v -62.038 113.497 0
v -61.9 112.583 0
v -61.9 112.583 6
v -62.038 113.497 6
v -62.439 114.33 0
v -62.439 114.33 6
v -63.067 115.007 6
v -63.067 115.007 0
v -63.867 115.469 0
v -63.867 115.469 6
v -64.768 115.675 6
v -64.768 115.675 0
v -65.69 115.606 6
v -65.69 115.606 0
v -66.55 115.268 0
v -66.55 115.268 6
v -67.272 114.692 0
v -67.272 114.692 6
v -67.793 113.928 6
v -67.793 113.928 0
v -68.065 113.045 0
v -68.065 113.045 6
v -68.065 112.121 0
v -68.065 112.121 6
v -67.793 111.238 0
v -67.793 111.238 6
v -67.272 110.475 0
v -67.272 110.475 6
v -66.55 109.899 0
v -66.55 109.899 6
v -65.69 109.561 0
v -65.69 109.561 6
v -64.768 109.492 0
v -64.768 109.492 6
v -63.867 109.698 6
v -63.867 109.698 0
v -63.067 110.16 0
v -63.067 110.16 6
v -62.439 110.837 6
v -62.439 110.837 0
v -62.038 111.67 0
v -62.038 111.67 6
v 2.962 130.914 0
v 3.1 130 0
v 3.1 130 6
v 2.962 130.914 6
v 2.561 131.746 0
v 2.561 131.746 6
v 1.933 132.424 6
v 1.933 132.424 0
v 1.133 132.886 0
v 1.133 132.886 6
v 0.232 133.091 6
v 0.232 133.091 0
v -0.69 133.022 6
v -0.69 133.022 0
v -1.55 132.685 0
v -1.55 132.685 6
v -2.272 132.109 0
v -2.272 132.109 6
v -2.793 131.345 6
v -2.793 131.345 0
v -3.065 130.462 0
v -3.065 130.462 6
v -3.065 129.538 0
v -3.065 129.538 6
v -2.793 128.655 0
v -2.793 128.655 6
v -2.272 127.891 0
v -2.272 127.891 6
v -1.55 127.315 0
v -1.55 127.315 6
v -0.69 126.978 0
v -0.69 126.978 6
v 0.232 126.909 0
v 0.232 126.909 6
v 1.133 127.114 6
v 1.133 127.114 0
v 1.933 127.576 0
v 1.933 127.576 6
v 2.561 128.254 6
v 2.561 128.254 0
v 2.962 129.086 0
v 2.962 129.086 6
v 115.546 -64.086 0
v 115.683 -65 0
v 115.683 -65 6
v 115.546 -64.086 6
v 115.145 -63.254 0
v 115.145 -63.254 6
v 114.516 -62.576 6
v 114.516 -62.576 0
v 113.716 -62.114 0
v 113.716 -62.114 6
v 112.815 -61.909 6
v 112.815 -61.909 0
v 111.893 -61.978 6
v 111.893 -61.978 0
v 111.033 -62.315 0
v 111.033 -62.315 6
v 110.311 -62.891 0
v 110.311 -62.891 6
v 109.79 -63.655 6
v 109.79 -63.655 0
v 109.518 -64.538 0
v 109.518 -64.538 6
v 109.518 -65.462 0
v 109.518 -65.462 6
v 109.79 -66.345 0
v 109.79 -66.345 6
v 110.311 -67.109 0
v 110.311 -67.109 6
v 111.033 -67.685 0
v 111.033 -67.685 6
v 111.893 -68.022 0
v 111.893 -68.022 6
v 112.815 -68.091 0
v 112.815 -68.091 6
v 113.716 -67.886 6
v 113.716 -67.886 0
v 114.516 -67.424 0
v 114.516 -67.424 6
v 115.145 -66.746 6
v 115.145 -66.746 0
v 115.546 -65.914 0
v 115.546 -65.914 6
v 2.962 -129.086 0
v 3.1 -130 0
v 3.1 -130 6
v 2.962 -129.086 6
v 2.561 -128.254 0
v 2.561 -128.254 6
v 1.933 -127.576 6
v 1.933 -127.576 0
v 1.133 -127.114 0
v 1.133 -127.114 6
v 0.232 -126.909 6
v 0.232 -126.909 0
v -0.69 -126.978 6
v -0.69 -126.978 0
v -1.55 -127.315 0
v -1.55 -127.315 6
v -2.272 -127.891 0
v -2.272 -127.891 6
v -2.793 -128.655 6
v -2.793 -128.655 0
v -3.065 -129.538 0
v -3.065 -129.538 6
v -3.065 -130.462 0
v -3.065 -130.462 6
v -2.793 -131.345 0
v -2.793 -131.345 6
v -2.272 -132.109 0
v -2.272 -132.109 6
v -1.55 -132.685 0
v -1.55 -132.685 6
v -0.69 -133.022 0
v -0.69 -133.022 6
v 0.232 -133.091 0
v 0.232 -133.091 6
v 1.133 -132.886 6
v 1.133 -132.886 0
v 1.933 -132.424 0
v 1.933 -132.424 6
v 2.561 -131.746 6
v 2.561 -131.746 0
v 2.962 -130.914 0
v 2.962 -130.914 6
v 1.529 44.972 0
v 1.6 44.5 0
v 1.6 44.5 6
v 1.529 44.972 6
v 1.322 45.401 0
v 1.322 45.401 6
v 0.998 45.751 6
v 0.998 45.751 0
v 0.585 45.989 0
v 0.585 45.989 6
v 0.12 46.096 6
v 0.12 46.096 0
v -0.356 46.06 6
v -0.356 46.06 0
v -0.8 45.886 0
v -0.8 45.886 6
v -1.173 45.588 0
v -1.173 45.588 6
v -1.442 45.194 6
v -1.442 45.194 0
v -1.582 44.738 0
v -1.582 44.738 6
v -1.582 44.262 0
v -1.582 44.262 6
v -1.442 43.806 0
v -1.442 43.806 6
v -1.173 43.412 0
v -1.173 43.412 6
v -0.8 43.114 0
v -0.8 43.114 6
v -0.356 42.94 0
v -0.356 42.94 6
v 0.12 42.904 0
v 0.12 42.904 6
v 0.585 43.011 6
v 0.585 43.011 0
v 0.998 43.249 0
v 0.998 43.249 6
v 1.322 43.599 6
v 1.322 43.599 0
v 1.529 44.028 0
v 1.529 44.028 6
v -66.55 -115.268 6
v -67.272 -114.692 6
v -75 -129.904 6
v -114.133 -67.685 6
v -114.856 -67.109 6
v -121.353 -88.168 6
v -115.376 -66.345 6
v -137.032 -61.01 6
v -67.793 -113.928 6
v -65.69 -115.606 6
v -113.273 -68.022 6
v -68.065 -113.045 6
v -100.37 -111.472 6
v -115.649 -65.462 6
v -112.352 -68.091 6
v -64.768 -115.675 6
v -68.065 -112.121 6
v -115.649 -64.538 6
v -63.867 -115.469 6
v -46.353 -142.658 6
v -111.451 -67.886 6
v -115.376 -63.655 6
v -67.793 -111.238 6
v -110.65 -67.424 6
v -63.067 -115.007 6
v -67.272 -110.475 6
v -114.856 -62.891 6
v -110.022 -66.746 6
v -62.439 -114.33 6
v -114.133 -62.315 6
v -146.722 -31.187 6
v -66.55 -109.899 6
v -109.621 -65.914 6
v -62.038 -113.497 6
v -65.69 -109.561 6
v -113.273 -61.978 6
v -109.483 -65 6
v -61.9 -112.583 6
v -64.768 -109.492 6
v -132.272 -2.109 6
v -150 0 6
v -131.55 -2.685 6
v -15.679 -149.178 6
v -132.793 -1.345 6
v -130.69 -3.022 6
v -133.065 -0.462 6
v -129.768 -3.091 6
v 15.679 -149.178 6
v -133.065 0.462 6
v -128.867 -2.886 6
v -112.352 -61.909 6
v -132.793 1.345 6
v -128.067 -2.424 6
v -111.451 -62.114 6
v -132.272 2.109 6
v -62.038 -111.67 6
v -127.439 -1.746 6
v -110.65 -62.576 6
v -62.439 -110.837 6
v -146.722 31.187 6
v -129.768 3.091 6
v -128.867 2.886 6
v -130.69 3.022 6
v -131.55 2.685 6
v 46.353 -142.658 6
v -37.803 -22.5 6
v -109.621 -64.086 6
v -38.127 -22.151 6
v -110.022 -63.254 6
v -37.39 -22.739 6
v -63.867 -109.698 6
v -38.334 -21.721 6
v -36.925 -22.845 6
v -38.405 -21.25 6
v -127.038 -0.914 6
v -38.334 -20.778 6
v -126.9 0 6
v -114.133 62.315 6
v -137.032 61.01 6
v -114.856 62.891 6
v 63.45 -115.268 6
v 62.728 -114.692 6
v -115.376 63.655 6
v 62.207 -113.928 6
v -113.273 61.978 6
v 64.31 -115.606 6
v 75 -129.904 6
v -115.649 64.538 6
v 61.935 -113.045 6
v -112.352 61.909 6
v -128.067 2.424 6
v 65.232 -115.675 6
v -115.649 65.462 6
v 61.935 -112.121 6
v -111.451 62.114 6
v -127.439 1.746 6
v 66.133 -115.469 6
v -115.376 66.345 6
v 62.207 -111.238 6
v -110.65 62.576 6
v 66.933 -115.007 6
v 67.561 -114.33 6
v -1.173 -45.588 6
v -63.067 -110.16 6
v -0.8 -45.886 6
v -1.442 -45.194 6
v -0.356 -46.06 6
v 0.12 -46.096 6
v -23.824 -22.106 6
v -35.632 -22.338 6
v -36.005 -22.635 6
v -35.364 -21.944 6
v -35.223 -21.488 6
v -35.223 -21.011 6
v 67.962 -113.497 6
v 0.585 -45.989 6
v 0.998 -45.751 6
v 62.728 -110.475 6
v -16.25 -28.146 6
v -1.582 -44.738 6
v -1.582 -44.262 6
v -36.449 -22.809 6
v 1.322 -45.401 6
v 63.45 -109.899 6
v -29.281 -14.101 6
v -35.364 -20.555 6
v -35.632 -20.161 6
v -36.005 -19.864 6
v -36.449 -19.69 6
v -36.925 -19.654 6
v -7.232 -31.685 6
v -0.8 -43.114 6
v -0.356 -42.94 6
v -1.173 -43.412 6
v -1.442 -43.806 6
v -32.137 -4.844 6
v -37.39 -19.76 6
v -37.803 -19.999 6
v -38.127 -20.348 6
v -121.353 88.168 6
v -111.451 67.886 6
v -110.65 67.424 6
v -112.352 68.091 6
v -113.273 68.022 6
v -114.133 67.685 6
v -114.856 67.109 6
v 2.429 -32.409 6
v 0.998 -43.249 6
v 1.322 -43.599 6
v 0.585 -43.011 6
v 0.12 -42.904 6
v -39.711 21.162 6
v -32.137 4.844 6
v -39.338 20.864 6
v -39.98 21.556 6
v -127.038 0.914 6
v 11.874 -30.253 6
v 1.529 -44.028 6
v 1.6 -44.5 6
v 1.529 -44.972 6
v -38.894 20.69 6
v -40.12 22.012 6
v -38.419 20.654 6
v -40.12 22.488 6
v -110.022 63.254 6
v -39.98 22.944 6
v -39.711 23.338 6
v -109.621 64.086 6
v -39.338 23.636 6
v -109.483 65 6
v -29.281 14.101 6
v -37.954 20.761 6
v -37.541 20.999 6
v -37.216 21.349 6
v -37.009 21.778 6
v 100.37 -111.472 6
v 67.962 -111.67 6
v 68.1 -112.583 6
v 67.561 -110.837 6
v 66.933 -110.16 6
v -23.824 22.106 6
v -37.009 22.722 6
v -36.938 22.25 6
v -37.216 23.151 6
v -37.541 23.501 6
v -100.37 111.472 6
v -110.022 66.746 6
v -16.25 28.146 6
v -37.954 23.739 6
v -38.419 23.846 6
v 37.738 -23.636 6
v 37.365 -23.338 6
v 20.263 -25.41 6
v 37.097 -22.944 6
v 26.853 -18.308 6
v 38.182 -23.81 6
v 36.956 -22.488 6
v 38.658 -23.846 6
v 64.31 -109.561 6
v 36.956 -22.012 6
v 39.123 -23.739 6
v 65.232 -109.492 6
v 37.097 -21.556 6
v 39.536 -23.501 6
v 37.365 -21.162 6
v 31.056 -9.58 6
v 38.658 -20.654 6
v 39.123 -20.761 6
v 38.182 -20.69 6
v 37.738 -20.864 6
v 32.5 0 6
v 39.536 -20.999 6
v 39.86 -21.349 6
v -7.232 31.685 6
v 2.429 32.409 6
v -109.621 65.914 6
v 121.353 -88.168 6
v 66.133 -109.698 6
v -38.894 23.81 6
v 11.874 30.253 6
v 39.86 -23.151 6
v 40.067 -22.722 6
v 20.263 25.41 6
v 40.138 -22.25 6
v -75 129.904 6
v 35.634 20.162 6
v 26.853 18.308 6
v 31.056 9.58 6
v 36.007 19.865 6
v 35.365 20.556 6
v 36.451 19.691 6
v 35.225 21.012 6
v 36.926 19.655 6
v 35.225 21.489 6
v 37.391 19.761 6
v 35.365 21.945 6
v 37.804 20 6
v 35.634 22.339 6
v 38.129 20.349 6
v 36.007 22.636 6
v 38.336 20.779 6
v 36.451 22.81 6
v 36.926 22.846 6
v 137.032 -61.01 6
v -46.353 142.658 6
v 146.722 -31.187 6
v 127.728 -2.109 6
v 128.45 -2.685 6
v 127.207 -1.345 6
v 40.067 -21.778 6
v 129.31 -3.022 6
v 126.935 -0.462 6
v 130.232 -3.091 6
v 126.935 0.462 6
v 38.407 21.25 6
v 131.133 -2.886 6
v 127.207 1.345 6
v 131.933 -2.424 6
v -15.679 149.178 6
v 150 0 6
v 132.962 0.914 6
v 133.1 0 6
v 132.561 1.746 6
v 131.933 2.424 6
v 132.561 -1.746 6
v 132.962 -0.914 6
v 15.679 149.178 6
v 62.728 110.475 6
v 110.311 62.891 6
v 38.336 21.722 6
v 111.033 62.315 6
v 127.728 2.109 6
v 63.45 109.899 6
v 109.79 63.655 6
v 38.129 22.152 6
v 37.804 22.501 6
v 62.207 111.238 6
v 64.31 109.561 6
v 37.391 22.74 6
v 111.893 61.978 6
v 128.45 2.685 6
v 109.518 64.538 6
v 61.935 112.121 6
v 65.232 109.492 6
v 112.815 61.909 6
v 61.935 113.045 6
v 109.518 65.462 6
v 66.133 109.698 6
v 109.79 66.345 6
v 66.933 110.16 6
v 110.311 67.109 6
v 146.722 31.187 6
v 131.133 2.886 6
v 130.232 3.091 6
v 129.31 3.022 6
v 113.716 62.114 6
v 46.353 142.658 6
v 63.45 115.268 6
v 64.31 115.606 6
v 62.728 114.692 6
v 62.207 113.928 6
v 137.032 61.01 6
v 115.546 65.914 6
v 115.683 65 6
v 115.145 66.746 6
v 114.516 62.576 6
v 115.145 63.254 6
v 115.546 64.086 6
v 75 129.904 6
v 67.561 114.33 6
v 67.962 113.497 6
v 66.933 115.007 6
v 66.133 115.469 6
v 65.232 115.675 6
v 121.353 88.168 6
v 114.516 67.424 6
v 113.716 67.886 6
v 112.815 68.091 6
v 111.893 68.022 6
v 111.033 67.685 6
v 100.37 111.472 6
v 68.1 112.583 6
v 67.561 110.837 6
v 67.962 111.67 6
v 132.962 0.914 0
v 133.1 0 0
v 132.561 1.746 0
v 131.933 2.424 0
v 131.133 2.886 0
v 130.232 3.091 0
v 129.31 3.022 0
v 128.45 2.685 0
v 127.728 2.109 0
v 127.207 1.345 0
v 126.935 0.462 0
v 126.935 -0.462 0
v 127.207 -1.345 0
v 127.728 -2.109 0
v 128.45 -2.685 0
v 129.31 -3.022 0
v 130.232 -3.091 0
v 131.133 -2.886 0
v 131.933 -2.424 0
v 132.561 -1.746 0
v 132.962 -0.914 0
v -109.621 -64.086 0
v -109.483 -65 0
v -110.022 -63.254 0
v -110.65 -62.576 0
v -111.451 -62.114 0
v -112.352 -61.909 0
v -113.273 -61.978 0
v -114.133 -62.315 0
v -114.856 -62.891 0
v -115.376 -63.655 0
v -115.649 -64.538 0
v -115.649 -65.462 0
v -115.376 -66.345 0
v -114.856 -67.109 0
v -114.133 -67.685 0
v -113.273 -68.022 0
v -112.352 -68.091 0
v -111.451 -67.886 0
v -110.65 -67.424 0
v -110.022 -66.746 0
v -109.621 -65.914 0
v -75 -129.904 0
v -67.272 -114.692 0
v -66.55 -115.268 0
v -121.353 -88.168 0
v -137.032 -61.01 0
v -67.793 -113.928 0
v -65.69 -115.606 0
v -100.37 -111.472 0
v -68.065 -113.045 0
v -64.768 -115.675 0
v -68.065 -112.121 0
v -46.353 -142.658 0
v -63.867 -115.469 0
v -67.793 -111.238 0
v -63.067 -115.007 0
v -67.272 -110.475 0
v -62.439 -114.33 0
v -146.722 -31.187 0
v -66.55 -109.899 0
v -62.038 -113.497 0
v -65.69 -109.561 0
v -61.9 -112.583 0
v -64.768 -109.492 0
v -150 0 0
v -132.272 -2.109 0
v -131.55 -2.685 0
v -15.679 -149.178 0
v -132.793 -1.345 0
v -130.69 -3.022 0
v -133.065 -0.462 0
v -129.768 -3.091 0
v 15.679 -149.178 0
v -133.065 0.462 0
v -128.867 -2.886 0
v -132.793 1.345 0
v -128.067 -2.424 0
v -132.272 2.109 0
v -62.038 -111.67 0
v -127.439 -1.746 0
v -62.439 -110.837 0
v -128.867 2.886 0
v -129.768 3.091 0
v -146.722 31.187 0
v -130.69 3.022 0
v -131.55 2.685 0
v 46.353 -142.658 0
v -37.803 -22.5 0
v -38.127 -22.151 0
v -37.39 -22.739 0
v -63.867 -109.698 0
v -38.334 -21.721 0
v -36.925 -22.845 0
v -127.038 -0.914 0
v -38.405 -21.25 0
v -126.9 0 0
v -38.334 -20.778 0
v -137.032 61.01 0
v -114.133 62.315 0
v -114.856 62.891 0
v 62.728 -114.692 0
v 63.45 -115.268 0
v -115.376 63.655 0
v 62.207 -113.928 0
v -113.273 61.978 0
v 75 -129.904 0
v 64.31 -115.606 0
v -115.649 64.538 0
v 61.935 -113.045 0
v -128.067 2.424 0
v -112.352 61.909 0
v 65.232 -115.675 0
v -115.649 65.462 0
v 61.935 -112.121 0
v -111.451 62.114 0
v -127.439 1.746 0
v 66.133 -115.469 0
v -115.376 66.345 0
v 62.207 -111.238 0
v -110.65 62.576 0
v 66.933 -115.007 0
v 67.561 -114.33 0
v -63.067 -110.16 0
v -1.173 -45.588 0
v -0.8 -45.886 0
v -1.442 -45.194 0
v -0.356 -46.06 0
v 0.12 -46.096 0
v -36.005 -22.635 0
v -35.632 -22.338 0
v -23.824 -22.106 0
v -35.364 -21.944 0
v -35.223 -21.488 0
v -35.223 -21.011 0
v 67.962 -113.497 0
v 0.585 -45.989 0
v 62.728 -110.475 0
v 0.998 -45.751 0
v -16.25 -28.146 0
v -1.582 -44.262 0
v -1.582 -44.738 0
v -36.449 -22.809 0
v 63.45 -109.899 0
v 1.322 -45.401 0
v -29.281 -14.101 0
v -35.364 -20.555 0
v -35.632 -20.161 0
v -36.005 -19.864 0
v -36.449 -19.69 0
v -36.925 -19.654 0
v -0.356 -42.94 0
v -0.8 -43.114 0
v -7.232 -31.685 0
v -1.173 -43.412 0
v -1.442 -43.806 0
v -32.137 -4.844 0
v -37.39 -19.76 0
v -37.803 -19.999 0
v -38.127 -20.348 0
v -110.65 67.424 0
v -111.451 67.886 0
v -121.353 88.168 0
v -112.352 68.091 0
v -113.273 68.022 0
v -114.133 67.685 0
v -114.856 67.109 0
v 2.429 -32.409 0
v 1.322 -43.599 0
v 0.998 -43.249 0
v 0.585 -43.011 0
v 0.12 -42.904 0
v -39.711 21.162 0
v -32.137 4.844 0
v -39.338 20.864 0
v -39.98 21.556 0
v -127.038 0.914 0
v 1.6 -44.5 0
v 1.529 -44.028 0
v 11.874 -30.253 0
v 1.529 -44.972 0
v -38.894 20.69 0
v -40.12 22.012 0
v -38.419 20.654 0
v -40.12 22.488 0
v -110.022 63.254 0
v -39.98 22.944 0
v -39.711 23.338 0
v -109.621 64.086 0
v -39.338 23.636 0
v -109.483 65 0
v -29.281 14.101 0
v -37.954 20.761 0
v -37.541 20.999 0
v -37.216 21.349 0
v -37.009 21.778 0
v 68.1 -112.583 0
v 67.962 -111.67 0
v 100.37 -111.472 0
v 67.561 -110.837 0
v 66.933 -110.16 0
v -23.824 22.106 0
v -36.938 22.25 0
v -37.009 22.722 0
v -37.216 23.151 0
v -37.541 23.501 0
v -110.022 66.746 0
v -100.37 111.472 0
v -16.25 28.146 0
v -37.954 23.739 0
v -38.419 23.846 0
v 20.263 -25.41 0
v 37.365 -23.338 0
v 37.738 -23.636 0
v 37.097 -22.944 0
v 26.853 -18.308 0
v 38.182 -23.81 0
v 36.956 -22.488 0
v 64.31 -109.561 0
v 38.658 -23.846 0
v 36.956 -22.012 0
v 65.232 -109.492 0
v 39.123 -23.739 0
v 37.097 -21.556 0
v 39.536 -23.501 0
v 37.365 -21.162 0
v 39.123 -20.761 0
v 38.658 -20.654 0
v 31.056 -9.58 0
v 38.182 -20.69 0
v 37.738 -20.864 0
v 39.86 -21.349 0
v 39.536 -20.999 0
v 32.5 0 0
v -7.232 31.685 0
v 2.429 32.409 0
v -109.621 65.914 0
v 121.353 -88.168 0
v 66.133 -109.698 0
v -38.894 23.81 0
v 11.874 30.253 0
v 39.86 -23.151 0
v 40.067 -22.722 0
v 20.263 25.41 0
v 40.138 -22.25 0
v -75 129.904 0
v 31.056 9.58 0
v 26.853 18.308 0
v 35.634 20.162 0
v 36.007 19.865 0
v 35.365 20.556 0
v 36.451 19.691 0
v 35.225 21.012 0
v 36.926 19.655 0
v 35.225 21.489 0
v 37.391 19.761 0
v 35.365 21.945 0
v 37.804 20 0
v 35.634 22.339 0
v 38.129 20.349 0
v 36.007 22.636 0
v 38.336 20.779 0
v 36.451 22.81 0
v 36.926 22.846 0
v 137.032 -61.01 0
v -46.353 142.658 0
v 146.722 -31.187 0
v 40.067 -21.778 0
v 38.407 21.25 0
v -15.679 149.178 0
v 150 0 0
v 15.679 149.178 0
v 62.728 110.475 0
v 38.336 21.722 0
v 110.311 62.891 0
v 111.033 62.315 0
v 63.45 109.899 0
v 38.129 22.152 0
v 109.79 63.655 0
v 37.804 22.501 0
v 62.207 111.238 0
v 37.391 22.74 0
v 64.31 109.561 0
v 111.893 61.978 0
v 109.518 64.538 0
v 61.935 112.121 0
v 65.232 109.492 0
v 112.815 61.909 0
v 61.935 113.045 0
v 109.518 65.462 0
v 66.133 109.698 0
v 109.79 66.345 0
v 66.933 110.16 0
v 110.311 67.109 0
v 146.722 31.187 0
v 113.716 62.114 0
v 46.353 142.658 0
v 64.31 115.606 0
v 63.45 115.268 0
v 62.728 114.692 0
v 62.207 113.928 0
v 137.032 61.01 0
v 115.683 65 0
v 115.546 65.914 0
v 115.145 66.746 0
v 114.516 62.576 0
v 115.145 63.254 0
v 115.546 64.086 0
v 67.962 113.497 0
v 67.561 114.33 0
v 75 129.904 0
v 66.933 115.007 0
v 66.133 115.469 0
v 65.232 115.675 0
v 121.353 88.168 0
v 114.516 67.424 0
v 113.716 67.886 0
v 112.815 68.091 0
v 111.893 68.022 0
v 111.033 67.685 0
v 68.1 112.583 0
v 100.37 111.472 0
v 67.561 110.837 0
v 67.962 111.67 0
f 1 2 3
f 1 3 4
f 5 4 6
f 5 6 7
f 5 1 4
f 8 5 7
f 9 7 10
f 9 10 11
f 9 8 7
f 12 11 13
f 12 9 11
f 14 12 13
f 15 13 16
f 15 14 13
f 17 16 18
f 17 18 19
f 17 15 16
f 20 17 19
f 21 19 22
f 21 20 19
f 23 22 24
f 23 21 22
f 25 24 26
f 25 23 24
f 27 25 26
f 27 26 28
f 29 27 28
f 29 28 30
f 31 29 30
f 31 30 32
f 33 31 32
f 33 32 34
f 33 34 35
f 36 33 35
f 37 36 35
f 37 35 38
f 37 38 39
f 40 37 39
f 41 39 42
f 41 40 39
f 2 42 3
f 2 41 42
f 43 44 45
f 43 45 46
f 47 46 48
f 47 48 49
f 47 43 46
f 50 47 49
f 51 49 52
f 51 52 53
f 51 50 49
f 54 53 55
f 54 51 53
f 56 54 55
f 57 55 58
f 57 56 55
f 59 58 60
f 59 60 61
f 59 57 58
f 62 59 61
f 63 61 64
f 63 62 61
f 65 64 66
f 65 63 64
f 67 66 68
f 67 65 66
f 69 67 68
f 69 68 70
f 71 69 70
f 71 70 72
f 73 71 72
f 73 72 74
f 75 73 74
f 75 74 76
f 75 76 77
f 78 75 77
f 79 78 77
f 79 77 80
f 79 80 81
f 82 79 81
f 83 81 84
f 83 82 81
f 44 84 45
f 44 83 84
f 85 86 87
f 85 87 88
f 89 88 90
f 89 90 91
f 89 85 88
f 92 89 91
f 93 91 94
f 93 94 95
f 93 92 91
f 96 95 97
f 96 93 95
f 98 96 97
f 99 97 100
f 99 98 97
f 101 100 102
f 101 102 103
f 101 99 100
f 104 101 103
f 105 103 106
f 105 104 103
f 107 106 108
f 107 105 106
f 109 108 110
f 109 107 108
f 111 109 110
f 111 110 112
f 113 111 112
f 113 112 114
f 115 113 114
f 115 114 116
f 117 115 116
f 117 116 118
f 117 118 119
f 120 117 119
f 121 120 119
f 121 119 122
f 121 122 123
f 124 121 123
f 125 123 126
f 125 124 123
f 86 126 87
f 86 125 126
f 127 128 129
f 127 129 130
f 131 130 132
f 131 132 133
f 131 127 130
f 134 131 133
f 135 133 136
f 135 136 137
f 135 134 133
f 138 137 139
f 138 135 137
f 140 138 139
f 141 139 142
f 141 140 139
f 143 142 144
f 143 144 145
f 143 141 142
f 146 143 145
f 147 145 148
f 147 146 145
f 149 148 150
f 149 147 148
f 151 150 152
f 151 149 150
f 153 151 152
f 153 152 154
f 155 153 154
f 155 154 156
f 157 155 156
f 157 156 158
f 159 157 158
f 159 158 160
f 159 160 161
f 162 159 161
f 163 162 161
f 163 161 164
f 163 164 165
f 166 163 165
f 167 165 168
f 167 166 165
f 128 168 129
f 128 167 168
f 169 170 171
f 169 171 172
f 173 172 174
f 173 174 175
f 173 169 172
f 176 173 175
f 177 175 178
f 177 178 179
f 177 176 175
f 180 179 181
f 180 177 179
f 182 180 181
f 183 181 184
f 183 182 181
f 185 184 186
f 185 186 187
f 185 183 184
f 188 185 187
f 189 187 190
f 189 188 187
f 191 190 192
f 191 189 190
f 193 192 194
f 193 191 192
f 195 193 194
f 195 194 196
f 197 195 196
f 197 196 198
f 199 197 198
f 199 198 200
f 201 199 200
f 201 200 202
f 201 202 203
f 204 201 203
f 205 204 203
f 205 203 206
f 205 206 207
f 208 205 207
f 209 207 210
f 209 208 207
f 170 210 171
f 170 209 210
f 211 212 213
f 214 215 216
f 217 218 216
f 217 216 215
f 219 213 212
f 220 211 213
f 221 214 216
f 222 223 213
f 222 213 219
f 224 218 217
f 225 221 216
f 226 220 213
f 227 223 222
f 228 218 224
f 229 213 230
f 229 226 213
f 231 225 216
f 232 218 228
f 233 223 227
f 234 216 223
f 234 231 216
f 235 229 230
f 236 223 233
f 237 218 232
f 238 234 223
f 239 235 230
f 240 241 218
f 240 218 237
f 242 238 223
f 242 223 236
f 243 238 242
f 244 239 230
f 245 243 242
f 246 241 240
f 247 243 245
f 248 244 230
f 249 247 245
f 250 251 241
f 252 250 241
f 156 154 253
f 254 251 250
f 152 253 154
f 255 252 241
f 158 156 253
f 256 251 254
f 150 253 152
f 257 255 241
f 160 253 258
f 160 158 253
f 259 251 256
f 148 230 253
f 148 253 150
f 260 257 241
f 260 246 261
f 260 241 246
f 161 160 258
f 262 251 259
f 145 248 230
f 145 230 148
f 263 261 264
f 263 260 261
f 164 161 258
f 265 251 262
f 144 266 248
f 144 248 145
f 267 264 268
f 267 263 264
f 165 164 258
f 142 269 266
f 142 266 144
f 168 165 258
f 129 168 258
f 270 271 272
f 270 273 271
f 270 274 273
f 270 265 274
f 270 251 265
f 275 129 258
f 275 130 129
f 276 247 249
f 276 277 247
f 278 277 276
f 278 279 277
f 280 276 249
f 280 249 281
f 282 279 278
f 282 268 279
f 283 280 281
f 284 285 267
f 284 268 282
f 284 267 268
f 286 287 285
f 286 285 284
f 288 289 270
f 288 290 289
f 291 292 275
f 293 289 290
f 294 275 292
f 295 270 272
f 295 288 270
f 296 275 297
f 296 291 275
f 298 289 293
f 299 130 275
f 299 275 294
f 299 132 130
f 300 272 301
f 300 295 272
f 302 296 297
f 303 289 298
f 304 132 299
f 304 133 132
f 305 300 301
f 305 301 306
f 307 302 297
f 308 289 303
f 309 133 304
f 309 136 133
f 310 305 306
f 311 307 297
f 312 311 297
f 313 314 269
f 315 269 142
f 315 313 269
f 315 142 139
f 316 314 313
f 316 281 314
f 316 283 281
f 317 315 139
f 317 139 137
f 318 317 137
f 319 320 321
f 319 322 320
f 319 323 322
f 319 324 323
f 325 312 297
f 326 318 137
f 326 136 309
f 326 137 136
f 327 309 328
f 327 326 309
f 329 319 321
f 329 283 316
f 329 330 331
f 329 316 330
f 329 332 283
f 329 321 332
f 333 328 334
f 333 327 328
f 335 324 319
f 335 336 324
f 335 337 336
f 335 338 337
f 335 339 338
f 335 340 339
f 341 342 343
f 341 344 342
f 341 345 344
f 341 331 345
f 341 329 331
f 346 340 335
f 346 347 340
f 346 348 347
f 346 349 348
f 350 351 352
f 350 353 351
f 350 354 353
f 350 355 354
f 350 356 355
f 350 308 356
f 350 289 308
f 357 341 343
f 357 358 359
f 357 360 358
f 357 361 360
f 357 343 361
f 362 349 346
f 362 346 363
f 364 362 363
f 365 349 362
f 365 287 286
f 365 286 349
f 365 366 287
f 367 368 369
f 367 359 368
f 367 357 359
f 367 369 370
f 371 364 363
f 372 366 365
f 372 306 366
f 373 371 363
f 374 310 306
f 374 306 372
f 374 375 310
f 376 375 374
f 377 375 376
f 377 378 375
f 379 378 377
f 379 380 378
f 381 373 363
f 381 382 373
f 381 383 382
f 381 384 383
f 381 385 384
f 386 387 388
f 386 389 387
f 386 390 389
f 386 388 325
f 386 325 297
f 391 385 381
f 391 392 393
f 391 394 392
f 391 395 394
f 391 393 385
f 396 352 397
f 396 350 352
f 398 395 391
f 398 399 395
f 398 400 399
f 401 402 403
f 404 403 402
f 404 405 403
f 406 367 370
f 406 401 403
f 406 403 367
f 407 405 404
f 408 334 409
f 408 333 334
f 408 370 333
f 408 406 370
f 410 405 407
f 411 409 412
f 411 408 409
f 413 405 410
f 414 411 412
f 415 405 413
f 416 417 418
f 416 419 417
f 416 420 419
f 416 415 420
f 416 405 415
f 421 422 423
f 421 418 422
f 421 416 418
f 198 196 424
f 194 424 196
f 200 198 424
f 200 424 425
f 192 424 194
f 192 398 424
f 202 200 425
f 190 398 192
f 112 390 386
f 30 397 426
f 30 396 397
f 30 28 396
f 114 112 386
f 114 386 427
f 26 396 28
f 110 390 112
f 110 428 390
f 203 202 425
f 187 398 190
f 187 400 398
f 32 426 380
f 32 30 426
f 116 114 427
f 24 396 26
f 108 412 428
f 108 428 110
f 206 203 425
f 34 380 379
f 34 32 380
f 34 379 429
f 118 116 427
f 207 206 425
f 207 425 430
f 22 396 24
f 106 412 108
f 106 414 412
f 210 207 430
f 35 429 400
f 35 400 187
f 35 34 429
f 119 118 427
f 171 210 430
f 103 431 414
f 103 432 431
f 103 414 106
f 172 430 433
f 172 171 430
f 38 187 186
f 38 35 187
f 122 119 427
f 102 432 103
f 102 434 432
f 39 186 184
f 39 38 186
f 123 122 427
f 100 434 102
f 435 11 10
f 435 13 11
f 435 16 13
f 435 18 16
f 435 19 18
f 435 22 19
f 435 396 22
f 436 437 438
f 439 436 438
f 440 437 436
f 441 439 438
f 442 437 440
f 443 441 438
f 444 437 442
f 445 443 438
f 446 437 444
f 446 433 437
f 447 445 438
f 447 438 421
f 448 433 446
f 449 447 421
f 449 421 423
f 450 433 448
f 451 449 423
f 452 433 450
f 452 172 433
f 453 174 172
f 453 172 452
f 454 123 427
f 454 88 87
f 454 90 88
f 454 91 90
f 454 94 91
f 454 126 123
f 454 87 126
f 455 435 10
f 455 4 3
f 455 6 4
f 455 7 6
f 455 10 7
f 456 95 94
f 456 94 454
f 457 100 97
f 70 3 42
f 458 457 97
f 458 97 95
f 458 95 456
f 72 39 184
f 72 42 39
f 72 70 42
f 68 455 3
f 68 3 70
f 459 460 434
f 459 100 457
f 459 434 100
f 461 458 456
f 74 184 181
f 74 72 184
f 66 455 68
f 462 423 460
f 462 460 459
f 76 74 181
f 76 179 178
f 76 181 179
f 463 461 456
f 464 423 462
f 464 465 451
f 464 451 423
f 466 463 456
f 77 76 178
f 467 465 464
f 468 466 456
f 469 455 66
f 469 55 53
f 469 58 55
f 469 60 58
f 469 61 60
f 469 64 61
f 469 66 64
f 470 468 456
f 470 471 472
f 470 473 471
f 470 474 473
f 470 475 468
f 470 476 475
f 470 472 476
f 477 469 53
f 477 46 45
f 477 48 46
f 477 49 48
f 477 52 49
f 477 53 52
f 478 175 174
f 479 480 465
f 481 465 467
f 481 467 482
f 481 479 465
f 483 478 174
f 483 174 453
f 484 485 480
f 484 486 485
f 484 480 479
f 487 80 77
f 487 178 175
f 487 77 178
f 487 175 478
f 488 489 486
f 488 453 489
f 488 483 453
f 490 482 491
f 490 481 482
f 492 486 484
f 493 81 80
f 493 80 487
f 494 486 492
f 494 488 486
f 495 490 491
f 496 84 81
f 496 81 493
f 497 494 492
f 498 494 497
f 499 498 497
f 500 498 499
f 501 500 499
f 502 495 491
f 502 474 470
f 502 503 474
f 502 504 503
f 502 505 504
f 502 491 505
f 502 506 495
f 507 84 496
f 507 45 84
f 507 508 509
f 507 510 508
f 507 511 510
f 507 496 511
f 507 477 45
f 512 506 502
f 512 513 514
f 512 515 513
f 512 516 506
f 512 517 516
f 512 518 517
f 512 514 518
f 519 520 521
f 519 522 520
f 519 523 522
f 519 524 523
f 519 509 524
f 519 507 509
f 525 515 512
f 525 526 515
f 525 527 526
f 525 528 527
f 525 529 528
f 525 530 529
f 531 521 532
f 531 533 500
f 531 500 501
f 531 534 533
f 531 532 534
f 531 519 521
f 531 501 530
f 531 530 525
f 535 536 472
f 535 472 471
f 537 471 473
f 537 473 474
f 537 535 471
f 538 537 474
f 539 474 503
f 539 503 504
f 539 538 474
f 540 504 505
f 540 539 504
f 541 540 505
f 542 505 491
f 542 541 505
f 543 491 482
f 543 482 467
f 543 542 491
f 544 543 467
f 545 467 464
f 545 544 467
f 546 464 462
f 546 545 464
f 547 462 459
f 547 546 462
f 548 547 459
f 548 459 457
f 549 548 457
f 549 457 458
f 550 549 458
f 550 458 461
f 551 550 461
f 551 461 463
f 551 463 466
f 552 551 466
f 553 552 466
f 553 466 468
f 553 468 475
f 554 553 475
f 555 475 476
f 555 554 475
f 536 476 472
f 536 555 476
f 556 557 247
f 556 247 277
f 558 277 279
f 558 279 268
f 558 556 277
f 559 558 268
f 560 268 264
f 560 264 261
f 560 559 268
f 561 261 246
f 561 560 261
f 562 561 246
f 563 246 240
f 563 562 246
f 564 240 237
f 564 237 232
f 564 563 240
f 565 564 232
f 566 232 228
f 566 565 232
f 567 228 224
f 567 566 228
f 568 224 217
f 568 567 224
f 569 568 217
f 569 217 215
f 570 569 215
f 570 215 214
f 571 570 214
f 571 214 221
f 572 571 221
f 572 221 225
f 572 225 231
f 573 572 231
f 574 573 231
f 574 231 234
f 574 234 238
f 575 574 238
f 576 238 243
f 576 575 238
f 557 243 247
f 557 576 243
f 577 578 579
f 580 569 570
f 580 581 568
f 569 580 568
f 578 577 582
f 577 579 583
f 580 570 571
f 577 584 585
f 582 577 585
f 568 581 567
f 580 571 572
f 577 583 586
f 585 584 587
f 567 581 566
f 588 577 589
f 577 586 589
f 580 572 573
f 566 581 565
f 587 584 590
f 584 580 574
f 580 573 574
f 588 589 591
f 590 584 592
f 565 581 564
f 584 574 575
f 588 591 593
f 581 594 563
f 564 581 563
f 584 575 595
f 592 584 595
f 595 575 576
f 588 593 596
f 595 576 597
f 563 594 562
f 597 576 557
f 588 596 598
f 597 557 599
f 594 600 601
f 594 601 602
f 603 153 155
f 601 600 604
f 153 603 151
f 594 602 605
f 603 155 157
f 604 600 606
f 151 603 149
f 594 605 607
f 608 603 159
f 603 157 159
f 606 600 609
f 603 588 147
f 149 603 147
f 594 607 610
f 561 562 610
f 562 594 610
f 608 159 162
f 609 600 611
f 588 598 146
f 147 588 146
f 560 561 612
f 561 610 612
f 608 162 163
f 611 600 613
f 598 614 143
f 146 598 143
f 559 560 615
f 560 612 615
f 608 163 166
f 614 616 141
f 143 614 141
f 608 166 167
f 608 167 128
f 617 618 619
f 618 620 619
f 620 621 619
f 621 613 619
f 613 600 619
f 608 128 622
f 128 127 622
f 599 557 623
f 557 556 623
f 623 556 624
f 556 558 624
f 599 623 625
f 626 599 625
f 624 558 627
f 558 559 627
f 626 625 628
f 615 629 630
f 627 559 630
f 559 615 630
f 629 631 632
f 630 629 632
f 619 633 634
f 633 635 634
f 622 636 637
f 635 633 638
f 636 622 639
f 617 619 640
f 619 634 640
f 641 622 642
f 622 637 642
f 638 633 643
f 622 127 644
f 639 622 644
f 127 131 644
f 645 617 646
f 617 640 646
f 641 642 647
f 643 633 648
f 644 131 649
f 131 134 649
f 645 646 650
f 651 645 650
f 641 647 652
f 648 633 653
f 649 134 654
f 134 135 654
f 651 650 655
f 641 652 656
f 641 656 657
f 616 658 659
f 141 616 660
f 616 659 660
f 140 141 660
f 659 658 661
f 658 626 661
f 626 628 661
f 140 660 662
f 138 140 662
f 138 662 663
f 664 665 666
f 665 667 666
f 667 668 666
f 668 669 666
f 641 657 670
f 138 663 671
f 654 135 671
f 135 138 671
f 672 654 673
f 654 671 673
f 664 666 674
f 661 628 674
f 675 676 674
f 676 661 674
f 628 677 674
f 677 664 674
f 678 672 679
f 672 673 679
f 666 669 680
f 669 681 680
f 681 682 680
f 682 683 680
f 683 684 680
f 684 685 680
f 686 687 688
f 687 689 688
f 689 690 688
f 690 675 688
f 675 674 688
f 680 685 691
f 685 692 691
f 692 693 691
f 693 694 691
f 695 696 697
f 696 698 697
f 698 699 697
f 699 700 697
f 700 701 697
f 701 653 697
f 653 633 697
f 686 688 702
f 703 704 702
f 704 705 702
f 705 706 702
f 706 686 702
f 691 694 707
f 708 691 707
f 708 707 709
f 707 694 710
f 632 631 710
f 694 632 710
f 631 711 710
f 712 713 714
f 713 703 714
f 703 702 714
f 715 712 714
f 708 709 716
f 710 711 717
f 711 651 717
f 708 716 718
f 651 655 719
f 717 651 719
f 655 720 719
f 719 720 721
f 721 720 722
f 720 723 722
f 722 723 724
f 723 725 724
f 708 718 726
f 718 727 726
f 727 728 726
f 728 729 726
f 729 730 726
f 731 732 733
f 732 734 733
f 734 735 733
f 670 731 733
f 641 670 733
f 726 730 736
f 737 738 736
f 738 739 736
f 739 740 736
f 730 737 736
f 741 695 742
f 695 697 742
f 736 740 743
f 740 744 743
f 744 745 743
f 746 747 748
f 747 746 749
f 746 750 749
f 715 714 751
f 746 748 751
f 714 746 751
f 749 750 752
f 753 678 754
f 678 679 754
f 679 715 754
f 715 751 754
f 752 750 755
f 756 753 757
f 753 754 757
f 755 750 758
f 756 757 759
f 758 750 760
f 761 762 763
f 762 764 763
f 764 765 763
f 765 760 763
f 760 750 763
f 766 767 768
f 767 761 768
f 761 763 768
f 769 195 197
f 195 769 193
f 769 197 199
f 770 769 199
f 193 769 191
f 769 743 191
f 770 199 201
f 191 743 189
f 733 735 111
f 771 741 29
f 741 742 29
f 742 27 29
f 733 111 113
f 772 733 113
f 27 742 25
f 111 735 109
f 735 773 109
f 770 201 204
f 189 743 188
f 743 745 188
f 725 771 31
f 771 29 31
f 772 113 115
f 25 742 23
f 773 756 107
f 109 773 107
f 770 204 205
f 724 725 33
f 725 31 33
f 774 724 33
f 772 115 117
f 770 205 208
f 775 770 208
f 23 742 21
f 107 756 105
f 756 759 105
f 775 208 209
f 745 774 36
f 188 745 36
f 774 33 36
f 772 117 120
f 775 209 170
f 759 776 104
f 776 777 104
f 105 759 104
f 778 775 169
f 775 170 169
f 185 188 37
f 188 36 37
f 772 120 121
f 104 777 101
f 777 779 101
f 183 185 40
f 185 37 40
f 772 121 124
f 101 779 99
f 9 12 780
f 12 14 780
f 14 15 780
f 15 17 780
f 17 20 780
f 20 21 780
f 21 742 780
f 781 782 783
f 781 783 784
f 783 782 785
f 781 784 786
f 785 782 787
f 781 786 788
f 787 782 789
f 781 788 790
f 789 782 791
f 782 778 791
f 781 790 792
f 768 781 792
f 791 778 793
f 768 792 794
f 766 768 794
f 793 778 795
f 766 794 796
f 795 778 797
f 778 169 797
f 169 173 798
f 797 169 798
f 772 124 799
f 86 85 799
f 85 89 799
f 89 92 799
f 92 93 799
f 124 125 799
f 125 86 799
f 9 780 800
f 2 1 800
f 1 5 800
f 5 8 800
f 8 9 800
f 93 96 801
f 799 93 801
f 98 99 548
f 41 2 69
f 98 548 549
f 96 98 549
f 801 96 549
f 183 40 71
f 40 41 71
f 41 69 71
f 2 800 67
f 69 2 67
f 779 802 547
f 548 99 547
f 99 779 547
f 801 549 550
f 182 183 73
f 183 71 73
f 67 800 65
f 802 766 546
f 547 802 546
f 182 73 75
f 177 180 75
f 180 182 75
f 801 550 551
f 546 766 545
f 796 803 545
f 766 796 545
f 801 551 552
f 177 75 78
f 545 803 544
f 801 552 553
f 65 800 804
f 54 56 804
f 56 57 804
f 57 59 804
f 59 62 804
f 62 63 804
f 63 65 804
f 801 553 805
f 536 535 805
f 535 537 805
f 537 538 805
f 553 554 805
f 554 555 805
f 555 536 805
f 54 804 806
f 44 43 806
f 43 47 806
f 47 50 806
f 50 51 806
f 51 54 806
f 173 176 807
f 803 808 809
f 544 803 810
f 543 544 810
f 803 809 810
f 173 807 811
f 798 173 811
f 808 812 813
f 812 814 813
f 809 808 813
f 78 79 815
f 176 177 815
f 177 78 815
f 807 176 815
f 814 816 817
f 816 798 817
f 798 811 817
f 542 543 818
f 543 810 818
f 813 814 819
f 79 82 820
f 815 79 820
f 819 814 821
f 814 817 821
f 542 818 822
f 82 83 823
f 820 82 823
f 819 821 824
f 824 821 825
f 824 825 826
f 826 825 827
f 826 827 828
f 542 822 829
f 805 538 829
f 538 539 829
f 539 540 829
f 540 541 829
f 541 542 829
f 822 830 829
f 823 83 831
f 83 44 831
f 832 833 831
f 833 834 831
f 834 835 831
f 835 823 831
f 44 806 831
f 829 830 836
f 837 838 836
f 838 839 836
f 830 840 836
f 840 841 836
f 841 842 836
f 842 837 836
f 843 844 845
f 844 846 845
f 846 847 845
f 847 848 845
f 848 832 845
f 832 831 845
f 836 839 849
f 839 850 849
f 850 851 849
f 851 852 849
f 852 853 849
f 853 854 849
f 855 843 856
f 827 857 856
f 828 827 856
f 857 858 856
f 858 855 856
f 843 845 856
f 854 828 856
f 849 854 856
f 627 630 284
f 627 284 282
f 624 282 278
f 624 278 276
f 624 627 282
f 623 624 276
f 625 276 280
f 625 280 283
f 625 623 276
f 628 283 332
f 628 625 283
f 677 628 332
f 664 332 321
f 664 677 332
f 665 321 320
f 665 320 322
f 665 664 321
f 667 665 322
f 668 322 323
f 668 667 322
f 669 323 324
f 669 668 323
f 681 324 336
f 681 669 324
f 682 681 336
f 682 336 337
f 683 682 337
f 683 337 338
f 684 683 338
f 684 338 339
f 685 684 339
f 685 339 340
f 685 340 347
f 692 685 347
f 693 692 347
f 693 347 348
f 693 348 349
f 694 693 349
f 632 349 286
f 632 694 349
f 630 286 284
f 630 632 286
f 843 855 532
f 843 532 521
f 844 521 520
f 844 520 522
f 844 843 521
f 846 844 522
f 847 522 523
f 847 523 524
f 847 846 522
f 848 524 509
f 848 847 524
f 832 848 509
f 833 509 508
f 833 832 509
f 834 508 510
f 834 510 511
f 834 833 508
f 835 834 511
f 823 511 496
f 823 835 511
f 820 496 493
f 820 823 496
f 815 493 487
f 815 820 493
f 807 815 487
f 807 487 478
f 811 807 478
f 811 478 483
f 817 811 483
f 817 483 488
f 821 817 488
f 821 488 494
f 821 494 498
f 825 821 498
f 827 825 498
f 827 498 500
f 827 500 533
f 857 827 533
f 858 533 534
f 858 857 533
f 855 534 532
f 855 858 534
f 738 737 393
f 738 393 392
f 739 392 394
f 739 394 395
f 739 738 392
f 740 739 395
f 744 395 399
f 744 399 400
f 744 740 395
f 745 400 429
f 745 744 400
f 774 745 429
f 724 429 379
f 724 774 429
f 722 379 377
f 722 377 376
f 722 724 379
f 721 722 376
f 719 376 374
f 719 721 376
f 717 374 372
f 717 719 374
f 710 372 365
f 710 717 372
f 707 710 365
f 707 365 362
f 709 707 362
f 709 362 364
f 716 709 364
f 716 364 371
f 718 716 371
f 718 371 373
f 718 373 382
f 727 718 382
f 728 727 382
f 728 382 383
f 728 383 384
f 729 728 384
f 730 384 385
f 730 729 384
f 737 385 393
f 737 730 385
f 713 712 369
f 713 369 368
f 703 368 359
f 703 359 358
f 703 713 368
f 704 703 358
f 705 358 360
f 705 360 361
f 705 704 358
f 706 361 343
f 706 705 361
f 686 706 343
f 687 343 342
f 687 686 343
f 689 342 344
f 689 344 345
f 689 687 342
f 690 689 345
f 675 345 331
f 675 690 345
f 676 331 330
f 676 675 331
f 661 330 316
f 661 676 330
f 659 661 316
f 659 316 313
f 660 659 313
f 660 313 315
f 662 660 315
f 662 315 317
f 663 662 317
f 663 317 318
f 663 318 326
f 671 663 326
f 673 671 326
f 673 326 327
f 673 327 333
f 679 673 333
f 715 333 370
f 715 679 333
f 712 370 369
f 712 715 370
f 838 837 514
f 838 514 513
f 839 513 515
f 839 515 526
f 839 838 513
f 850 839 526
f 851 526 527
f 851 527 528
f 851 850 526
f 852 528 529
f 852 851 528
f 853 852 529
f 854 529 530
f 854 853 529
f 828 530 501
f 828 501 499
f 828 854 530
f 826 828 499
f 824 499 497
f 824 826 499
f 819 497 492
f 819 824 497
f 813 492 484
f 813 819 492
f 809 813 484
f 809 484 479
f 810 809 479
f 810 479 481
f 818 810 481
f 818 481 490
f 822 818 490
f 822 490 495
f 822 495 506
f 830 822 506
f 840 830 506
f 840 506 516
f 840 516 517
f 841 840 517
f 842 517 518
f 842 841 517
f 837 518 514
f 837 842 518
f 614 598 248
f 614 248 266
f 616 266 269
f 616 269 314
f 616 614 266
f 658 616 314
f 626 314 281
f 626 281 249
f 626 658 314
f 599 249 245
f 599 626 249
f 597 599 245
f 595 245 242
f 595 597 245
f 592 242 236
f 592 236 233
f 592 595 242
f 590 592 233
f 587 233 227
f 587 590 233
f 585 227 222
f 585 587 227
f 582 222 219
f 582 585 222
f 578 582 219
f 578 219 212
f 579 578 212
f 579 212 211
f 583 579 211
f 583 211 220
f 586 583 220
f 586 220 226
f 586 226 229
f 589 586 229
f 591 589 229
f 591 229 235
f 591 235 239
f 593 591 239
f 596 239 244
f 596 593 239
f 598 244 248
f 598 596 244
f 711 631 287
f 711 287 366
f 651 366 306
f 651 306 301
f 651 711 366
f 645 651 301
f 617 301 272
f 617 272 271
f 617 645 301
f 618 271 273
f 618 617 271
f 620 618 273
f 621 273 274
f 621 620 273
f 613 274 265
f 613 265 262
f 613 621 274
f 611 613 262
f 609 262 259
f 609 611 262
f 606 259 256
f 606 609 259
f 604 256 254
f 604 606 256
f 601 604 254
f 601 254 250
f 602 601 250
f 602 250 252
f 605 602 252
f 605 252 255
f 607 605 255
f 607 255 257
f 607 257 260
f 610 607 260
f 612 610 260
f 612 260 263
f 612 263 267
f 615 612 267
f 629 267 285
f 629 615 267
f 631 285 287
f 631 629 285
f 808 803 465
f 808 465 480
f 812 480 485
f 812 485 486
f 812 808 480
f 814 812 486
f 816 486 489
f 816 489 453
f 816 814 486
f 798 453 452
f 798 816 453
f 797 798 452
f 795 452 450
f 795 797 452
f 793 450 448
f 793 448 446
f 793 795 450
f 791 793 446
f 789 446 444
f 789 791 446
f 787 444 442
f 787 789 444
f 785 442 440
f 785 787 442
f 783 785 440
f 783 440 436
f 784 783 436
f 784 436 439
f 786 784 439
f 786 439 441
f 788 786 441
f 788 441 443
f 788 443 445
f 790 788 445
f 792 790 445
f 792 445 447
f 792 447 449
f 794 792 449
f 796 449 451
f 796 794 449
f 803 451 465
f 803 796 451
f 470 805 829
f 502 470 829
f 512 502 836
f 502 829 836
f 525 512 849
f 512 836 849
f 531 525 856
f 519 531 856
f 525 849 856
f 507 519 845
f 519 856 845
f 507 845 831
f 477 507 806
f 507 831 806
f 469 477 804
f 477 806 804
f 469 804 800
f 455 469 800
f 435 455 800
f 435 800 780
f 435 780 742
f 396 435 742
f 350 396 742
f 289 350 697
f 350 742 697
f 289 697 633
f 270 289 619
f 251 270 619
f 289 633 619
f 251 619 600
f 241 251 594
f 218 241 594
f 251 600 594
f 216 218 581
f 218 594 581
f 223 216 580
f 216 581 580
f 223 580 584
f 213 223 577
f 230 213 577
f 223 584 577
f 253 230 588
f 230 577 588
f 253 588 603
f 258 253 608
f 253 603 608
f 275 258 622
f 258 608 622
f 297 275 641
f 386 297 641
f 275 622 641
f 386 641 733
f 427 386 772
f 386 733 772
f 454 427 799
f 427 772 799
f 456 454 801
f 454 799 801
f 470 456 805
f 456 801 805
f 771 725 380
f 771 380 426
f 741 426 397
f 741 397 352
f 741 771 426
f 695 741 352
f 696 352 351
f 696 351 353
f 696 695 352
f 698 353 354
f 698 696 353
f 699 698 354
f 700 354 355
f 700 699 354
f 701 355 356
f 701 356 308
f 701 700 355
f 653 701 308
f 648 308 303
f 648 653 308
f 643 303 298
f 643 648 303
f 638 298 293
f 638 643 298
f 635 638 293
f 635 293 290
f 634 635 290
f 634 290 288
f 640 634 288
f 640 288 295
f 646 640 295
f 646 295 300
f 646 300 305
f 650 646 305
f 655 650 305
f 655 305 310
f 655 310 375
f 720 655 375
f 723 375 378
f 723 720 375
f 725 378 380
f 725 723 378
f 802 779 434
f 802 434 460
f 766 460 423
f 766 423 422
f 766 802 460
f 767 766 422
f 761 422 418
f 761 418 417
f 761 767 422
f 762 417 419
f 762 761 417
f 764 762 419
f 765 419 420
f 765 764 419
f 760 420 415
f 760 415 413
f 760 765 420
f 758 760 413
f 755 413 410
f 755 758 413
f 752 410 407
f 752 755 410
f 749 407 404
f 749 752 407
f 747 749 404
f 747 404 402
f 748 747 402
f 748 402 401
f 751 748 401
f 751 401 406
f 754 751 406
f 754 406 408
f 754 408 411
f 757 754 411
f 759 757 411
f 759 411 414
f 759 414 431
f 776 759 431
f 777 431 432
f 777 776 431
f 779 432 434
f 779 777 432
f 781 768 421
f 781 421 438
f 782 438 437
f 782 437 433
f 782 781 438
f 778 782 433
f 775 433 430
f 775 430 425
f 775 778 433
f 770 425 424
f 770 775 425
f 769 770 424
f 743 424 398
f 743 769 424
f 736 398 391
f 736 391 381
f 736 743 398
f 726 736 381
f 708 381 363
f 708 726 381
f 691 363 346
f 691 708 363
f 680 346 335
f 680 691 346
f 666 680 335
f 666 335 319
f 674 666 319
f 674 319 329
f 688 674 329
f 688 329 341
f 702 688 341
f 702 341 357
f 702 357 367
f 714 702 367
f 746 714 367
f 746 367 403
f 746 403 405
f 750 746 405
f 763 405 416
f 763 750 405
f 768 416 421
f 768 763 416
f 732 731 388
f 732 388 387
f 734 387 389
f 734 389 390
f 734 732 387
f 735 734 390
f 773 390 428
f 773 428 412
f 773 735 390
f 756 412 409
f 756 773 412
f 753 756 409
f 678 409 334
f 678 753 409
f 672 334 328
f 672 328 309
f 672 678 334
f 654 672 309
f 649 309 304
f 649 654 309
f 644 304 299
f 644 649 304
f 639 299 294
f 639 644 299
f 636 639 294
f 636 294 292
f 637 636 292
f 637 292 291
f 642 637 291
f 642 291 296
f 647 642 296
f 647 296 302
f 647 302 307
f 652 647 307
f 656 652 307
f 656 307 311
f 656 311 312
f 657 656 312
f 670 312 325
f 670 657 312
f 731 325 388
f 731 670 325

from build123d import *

# Parameters (mm, degrees)
SKETCH_1_R      = 150
SKETCH_1_R_2    = 32.5
SKETCH_1_R_3    = 3.1
SKETCH_1_R_4    = 1.6
EXTRUDE_1_DEPTH = 6


with BuildPart() as part:
    # 草图1 → 凸台-拉伸1 (new body)
    with BuildSketch(Plane.XY):
        Circle(SKETCH_1_R)
        Circle(SKETCH_1_R_2, mode=Mode.SUBTRACT)
        with Locations((0, 130)):
            Circle(SKETCH_1_R_3, mode=Mode.SUBTRACT)
        with Locations((65, 112.583302492)):
            Circle(SKETCH_1_R_3, mode=Mode.SUBTRACT)
        with Locations((112.583302492, 65)):
            Circle(SKETCH_1_R_3, mode=Mode.SUBTRACT)
        with Locations((130, 0)):
            Circle(SKETCH_1_R_3, mode=Mode.SUBTRACT)
        with Locations((112.583302492, -65)):
            Circle(SKETCH_1_R_3, mode=Mode.SUBTRACT)
        with Locations((65, -112.583302492)):
            Circle(SKETCH_1_R_3, mode=Mode.SUBTRACT)
        with Locations((0, -130)):
            Circle(SKETCH_1_R_3, mode=Mode.SUBTRACT)
        with Locations((-65, -112.583302492)):
            Circle(SKETCH_1_R_3, mode=Mode.SUBTRACT)
        with Locations((-112.583302492, -65)):
            Circle(SKETCH_1_R_3, mode=Mode.SUBTRACT)
        with Locations((-130, 0)):
            Circle(SKETCH_1_R_3, mode=Mode.SUBTRACT)
        with Locations((-112.583302492, 65)):
            Circle(SKETCH_1_R_3, mode=Mode.SUBTRACT)
        with Locations((-65, 112.583302492)):
            Circle(SKETCH_1_R_3, mode=Mode.SUBTRACT)
        with Locations((0, 44.5)):
            Circle(SKETCH_1_R_4, mode=Mode.SUBTRACT)
        with Locations((38.538130468, -22.25)):
            Circle(SKETCH_1_R_4, mode=Mode.SUBTRACT)
        with Locations((0, -44.5)):
            Circle(SKETCH_1_R_4, mode=Mode.SUBTRACT)
        with Locations((-38.538130468, 22.25)):
            Circle(SKETCH_1_R_4, mode=Mode.SUBTRACT)
        with Locations((36.806829661, 21.250433013)):
            Circle(SKETCH_1_R_4, mode=Mode.SUBTRACT)
        with Locations(Location((-36.805329661, -21.249566987, 0), (0, 0, 180))):
            Circle(SKETCH_1_R_4, mode=Mode.SUBTRACT)
    extrude(amount=EXTRUDE_1_DEPTH)


solid = part.part
